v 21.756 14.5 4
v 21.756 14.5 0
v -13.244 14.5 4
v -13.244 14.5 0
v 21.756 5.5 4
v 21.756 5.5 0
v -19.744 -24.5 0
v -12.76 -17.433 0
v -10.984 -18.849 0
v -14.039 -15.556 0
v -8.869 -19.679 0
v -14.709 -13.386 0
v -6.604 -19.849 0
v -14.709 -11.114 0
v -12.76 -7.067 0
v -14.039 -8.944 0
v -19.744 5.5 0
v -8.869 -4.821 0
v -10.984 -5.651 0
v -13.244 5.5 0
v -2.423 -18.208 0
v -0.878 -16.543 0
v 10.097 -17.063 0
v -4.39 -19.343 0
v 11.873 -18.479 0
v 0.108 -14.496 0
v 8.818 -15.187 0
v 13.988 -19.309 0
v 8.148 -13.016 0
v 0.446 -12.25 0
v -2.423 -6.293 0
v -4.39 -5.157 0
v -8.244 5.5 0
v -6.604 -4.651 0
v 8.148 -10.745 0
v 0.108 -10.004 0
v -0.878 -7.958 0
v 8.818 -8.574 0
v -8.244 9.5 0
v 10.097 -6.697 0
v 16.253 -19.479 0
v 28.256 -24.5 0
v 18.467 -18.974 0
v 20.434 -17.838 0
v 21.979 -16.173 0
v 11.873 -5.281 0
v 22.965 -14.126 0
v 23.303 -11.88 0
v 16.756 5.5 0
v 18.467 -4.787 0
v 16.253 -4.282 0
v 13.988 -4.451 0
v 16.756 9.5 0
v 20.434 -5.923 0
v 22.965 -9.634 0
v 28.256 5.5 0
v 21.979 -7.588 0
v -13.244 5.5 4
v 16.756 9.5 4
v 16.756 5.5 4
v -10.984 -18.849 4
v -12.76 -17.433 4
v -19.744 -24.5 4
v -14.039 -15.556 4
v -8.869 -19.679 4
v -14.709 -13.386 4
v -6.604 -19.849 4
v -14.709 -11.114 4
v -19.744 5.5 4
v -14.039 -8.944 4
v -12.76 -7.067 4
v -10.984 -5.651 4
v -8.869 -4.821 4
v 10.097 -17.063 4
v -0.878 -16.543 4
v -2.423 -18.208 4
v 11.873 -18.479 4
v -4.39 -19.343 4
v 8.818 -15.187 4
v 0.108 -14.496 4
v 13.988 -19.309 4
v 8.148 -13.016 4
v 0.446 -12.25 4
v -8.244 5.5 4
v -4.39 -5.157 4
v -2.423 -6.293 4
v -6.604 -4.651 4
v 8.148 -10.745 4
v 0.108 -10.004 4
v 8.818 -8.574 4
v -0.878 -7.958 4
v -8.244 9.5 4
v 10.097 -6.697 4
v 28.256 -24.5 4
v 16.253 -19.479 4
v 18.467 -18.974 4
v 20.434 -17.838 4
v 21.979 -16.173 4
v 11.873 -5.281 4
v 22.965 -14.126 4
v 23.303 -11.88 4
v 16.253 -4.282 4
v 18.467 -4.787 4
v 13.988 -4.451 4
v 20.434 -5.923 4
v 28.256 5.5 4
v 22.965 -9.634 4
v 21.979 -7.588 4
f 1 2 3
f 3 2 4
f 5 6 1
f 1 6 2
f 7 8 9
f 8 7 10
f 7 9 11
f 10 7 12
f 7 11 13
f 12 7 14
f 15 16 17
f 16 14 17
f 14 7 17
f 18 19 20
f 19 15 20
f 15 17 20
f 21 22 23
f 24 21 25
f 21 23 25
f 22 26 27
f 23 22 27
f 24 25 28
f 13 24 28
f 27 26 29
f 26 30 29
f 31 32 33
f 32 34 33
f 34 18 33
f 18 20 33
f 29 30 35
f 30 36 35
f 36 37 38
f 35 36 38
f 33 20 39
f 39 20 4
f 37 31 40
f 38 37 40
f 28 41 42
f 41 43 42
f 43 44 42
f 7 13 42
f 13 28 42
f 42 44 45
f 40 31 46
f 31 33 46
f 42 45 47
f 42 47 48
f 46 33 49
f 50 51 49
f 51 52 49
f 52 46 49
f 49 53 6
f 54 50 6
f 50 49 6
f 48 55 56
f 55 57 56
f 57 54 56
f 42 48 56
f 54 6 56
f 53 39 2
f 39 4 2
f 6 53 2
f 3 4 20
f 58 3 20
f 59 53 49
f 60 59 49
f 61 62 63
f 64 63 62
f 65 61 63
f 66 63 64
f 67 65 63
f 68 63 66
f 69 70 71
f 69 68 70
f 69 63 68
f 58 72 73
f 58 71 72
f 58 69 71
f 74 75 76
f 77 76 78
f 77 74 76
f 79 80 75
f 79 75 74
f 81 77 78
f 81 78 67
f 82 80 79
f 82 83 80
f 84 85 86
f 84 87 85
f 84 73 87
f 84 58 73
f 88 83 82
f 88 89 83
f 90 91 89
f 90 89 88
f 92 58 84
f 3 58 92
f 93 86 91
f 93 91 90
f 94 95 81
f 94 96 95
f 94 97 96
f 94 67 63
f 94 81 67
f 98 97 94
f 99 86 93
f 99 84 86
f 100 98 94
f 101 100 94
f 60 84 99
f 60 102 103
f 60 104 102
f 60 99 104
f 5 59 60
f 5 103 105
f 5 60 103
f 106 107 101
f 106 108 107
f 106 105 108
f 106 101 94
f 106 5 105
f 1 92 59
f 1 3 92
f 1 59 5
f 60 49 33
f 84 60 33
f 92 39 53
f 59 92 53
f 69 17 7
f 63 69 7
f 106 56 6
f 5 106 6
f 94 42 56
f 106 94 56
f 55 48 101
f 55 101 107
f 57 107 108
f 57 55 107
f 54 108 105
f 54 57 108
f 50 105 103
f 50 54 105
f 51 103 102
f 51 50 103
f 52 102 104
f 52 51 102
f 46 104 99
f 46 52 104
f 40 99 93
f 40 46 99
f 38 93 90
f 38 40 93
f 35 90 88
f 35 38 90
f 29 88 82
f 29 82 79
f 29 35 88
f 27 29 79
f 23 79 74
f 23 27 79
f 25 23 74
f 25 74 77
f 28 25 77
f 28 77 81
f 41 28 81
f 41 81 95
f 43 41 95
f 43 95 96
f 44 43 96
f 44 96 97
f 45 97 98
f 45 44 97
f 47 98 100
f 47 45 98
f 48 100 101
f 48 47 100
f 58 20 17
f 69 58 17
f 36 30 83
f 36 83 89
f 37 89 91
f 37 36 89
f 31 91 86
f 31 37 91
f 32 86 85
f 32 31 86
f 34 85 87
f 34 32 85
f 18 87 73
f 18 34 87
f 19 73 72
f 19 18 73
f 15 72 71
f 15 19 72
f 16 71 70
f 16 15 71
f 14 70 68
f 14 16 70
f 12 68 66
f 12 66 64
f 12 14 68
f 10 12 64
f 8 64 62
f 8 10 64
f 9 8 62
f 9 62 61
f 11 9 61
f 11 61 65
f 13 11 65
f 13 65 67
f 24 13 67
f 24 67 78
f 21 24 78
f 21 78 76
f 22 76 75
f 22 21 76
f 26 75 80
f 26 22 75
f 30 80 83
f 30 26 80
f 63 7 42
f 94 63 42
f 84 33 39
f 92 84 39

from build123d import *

# Parameters (mm, degrees)
SKICA1_R                = 7.62
P_IDAT_VYSUNUT_M1_DEPTH = 4


with BuildPart() as part:
    # Skica1 → Přidat vysunutím1 (new body)
    with BuildSketch(Plane.XY):
        Polygon((-13.243861265, 5.499663067), (-19.743861265, 5.499663067), (-19.743861265, -24.500336933), (28.256138735, -24.500336933), (28.256138735, 5.499663067), (21.756138735, 5.499663067), (16.756138735, 5.499663067), (-8.243861265, 5.499663067), align=None)
        with Locations((-7.173861265, -12.250168466)):
            Circle(SKICA1_R, mode=Mode.SUBTRACT)
        with Locations((15.683146952, -11.880336933)):
            Circle(SKICA1_R, mode=Mode.SUBTRACT)
        Polygon((-13.243861265, 14.499663067), (-13.243861265, 5.499663067), (-8.243861265, 5.499663067), (-8.243861265, 9.499663067), (16.756138735, 9.499663067), (16.756138735, 5.499663067), (21.756138735, 5.499663067), (21.756138735, 14.499663067), align=None)
    extrude(amount=P_IDAT_VYSUNUT_M1_DEPTH)


solid = part.part
